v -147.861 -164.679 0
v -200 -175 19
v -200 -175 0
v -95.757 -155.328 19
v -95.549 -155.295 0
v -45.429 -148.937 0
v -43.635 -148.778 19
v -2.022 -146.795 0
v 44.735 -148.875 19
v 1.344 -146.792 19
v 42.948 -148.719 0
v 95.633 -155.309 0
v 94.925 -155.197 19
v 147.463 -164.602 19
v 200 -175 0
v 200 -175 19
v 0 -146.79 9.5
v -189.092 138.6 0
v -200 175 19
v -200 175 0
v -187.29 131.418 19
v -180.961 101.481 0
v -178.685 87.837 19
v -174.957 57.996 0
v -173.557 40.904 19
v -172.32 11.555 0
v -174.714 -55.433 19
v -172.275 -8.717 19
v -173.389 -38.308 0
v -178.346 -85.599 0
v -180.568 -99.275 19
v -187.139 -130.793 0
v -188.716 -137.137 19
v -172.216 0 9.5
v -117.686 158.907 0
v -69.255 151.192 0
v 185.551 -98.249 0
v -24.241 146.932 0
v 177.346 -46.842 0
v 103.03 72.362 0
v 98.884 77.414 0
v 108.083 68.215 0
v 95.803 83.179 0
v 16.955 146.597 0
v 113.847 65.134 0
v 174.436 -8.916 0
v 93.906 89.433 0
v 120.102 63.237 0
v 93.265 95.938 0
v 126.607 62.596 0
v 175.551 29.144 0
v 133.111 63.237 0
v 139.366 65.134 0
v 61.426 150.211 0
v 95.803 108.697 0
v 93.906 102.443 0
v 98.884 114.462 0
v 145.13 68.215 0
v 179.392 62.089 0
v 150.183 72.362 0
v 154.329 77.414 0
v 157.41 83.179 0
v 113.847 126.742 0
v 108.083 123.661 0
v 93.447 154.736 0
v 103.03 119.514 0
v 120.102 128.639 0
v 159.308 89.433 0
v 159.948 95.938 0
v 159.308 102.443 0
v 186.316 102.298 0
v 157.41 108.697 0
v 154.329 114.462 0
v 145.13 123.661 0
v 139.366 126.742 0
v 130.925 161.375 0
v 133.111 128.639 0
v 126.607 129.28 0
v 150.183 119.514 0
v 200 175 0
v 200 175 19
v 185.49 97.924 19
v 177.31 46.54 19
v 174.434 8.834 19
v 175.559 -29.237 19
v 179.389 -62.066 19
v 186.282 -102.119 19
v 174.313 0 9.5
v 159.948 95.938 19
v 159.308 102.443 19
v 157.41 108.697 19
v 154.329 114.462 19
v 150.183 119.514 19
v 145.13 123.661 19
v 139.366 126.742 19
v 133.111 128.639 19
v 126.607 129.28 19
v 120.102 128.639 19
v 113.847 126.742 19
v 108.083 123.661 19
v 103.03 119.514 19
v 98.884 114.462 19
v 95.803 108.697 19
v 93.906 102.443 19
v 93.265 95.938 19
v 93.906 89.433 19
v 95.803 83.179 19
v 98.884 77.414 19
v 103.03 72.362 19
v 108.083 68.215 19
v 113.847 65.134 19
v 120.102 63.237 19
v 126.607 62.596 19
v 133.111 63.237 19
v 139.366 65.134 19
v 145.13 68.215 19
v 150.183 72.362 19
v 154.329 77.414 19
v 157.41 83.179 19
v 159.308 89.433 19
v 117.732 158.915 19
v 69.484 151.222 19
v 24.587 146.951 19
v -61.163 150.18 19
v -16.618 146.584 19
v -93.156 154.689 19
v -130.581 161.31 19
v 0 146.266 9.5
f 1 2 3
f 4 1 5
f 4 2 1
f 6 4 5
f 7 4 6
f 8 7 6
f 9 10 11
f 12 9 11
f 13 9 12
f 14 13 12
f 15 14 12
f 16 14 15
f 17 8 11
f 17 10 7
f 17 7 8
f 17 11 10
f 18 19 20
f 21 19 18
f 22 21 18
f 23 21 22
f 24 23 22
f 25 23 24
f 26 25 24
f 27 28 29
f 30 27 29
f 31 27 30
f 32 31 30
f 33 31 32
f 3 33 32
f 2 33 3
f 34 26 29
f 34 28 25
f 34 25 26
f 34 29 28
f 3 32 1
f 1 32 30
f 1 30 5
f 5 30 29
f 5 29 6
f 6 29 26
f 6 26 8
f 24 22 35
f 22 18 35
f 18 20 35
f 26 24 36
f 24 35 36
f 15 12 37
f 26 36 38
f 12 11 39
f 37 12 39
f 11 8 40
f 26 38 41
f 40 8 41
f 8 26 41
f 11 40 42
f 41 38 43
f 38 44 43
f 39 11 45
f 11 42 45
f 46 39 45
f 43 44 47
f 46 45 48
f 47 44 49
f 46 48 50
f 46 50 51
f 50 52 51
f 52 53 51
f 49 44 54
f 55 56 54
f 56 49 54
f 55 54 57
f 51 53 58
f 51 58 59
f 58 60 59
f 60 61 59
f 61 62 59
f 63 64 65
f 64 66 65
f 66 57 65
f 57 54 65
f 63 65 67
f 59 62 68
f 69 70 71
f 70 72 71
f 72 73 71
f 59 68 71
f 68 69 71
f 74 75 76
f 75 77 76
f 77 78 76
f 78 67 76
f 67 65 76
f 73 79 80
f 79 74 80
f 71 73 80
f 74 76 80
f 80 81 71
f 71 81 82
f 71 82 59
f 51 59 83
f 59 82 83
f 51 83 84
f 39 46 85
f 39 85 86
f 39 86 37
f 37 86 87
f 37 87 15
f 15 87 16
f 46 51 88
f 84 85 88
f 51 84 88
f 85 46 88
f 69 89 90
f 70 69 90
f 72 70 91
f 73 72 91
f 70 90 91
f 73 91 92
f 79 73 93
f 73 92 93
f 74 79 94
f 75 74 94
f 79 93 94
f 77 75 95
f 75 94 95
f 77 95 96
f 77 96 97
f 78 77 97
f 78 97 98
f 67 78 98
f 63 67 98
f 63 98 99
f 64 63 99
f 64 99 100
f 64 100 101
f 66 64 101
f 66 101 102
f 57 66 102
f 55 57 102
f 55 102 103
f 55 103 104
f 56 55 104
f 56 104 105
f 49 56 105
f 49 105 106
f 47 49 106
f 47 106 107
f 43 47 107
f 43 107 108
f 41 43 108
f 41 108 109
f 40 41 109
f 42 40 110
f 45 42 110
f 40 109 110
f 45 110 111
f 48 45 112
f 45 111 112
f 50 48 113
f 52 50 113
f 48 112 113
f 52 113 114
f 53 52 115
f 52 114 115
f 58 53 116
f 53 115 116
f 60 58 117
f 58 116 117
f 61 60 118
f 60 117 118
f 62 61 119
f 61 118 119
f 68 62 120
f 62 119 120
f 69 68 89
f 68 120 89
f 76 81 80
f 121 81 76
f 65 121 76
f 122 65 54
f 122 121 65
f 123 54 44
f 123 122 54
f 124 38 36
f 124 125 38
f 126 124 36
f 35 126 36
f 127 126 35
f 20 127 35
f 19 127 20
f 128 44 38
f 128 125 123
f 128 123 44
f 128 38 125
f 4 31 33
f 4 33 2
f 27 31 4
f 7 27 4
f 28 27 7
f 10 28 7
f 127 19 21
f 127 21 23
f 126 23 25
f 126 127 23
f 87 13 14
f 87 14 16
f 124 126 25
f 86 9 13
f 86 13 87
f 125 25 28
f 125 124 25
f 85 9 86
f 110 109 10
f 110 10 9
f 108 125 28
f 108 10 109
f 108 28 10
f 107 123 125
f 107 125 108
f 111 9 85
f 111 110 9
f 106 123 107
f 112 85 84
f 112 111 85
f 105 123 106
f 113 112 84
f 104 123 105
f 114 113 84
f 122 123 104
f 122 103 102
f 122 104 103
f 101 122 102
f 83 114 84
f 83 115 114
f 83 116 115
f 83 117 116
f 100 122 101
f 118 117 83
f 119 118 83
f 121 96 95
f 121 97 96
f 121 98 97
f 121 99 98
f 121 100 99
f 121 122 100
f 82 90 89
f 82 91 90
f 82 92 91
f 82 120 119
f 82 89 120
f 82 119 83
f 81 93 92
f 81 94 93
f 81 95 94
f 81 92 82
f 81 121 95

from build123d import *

# Parameters (mm, degrees)
F0_W     = 400
F0_H     = 350
F1_DEPTH = 19
F3_DEPTH = 25
F4_DEPTH = 19.0010001
F5_DEPTH = 19.0010001
F6_DEPTH = 19.0010001
F2_R     = 33.3416918337
F7_DEPTH = 19.0010001


with BuildPart() as f1:
    # F0 (on Top) → F1 (new body)
    with BuildSketch(Plane.XY):
        Rectangle(F0_W, F0_H)
    extrude(amount=F1_DEPTH)

    # F2 (on face) → F3 (cut)
    with BuildSketch(Plane.XY.offset(19)):
        with BuildLine():
            add(Edge.make_bspline(
                [(200, 175), (133.3333333333, 162.1404528618), (0, 130.3916335106), (-133.3333333333, 162.1404528618), (-200, 175)],
                knots=[0, 0, 0, 0, 0.5, 1, 1, 1, 1], degree=3))
            Line((200, 175), (-200, 175))
        make_face()
    extrude(amount=-F3_DEPTH, mode=Mode.SUBTRACT)

    # F2 (on face) → F4 (cut, through all)
    with BuildSketch(Plane.XY.offset(19)):
        with BuildLine():
            add(Edge.make_bspline(
                [(-200, 175), (-180.0667330623, 116.6666666667), (-164.3662169576, 0), (-180.0667330623, -116.6666666667), (-200, -175)],
                knots=[0, 0, 0, 0, 0.5, 1, 1, 1, 1], degree=3))
            Line((-200, 175), (-200, -175))
        make_face()
    extrude(amount=-F4_DEPTH, mode=Mode.SUBTRACT)

    # F2 (on face) → F5 (cut, through all)
    with BuildSketch(Plane.XY.offset(19)):
        with BuildLine():
            Line((-200, -175), (200, -175))
            add(Edge.make_bspline(
                [(-200, -175), (-133.3333333333, -161.9723156095), (0, -131.6082760692), (133.3333333333, -161.9723156095), (200, -175)],
                knots=[0, 0, 0, 0, 0.5, 1, 1, 1, 1], degree=3))
        make_face()
    extrude(amount=-F5_DEPTH, mode=Mode.SUBTRACT)

    # F2 (on face) → F6 (cut, through all)
    with BuildSketch(Plane.XY.offset(19)):
        with BuildLine():
            Line((200, -175), (200, 175))
            add(Edge.make_bspline(
                [(200, 175), (190.449437499, 116.6666666667), (158.1775337458, 0), (190.449437499, -116.6666666667), (200, -175)],
                knots=[0, 0, 0, 0, 0.5, 1, 1, 1, 1], degree=3))
        make_face()
    extrude(amount=-F6_DEPTH, mode=Mode.SUBTRACT)

    # F2 (on face) → F7 (cut, through all)
    with BuildSketch(Plane.XY.offset(19)):
        with Locations((126.6066282988, 95.9379523993)):
            Circle(F2_R)
    extrude(amount=-F7_DEPTH, mode=Mode.SUBTRACT)


solid = f1.part
